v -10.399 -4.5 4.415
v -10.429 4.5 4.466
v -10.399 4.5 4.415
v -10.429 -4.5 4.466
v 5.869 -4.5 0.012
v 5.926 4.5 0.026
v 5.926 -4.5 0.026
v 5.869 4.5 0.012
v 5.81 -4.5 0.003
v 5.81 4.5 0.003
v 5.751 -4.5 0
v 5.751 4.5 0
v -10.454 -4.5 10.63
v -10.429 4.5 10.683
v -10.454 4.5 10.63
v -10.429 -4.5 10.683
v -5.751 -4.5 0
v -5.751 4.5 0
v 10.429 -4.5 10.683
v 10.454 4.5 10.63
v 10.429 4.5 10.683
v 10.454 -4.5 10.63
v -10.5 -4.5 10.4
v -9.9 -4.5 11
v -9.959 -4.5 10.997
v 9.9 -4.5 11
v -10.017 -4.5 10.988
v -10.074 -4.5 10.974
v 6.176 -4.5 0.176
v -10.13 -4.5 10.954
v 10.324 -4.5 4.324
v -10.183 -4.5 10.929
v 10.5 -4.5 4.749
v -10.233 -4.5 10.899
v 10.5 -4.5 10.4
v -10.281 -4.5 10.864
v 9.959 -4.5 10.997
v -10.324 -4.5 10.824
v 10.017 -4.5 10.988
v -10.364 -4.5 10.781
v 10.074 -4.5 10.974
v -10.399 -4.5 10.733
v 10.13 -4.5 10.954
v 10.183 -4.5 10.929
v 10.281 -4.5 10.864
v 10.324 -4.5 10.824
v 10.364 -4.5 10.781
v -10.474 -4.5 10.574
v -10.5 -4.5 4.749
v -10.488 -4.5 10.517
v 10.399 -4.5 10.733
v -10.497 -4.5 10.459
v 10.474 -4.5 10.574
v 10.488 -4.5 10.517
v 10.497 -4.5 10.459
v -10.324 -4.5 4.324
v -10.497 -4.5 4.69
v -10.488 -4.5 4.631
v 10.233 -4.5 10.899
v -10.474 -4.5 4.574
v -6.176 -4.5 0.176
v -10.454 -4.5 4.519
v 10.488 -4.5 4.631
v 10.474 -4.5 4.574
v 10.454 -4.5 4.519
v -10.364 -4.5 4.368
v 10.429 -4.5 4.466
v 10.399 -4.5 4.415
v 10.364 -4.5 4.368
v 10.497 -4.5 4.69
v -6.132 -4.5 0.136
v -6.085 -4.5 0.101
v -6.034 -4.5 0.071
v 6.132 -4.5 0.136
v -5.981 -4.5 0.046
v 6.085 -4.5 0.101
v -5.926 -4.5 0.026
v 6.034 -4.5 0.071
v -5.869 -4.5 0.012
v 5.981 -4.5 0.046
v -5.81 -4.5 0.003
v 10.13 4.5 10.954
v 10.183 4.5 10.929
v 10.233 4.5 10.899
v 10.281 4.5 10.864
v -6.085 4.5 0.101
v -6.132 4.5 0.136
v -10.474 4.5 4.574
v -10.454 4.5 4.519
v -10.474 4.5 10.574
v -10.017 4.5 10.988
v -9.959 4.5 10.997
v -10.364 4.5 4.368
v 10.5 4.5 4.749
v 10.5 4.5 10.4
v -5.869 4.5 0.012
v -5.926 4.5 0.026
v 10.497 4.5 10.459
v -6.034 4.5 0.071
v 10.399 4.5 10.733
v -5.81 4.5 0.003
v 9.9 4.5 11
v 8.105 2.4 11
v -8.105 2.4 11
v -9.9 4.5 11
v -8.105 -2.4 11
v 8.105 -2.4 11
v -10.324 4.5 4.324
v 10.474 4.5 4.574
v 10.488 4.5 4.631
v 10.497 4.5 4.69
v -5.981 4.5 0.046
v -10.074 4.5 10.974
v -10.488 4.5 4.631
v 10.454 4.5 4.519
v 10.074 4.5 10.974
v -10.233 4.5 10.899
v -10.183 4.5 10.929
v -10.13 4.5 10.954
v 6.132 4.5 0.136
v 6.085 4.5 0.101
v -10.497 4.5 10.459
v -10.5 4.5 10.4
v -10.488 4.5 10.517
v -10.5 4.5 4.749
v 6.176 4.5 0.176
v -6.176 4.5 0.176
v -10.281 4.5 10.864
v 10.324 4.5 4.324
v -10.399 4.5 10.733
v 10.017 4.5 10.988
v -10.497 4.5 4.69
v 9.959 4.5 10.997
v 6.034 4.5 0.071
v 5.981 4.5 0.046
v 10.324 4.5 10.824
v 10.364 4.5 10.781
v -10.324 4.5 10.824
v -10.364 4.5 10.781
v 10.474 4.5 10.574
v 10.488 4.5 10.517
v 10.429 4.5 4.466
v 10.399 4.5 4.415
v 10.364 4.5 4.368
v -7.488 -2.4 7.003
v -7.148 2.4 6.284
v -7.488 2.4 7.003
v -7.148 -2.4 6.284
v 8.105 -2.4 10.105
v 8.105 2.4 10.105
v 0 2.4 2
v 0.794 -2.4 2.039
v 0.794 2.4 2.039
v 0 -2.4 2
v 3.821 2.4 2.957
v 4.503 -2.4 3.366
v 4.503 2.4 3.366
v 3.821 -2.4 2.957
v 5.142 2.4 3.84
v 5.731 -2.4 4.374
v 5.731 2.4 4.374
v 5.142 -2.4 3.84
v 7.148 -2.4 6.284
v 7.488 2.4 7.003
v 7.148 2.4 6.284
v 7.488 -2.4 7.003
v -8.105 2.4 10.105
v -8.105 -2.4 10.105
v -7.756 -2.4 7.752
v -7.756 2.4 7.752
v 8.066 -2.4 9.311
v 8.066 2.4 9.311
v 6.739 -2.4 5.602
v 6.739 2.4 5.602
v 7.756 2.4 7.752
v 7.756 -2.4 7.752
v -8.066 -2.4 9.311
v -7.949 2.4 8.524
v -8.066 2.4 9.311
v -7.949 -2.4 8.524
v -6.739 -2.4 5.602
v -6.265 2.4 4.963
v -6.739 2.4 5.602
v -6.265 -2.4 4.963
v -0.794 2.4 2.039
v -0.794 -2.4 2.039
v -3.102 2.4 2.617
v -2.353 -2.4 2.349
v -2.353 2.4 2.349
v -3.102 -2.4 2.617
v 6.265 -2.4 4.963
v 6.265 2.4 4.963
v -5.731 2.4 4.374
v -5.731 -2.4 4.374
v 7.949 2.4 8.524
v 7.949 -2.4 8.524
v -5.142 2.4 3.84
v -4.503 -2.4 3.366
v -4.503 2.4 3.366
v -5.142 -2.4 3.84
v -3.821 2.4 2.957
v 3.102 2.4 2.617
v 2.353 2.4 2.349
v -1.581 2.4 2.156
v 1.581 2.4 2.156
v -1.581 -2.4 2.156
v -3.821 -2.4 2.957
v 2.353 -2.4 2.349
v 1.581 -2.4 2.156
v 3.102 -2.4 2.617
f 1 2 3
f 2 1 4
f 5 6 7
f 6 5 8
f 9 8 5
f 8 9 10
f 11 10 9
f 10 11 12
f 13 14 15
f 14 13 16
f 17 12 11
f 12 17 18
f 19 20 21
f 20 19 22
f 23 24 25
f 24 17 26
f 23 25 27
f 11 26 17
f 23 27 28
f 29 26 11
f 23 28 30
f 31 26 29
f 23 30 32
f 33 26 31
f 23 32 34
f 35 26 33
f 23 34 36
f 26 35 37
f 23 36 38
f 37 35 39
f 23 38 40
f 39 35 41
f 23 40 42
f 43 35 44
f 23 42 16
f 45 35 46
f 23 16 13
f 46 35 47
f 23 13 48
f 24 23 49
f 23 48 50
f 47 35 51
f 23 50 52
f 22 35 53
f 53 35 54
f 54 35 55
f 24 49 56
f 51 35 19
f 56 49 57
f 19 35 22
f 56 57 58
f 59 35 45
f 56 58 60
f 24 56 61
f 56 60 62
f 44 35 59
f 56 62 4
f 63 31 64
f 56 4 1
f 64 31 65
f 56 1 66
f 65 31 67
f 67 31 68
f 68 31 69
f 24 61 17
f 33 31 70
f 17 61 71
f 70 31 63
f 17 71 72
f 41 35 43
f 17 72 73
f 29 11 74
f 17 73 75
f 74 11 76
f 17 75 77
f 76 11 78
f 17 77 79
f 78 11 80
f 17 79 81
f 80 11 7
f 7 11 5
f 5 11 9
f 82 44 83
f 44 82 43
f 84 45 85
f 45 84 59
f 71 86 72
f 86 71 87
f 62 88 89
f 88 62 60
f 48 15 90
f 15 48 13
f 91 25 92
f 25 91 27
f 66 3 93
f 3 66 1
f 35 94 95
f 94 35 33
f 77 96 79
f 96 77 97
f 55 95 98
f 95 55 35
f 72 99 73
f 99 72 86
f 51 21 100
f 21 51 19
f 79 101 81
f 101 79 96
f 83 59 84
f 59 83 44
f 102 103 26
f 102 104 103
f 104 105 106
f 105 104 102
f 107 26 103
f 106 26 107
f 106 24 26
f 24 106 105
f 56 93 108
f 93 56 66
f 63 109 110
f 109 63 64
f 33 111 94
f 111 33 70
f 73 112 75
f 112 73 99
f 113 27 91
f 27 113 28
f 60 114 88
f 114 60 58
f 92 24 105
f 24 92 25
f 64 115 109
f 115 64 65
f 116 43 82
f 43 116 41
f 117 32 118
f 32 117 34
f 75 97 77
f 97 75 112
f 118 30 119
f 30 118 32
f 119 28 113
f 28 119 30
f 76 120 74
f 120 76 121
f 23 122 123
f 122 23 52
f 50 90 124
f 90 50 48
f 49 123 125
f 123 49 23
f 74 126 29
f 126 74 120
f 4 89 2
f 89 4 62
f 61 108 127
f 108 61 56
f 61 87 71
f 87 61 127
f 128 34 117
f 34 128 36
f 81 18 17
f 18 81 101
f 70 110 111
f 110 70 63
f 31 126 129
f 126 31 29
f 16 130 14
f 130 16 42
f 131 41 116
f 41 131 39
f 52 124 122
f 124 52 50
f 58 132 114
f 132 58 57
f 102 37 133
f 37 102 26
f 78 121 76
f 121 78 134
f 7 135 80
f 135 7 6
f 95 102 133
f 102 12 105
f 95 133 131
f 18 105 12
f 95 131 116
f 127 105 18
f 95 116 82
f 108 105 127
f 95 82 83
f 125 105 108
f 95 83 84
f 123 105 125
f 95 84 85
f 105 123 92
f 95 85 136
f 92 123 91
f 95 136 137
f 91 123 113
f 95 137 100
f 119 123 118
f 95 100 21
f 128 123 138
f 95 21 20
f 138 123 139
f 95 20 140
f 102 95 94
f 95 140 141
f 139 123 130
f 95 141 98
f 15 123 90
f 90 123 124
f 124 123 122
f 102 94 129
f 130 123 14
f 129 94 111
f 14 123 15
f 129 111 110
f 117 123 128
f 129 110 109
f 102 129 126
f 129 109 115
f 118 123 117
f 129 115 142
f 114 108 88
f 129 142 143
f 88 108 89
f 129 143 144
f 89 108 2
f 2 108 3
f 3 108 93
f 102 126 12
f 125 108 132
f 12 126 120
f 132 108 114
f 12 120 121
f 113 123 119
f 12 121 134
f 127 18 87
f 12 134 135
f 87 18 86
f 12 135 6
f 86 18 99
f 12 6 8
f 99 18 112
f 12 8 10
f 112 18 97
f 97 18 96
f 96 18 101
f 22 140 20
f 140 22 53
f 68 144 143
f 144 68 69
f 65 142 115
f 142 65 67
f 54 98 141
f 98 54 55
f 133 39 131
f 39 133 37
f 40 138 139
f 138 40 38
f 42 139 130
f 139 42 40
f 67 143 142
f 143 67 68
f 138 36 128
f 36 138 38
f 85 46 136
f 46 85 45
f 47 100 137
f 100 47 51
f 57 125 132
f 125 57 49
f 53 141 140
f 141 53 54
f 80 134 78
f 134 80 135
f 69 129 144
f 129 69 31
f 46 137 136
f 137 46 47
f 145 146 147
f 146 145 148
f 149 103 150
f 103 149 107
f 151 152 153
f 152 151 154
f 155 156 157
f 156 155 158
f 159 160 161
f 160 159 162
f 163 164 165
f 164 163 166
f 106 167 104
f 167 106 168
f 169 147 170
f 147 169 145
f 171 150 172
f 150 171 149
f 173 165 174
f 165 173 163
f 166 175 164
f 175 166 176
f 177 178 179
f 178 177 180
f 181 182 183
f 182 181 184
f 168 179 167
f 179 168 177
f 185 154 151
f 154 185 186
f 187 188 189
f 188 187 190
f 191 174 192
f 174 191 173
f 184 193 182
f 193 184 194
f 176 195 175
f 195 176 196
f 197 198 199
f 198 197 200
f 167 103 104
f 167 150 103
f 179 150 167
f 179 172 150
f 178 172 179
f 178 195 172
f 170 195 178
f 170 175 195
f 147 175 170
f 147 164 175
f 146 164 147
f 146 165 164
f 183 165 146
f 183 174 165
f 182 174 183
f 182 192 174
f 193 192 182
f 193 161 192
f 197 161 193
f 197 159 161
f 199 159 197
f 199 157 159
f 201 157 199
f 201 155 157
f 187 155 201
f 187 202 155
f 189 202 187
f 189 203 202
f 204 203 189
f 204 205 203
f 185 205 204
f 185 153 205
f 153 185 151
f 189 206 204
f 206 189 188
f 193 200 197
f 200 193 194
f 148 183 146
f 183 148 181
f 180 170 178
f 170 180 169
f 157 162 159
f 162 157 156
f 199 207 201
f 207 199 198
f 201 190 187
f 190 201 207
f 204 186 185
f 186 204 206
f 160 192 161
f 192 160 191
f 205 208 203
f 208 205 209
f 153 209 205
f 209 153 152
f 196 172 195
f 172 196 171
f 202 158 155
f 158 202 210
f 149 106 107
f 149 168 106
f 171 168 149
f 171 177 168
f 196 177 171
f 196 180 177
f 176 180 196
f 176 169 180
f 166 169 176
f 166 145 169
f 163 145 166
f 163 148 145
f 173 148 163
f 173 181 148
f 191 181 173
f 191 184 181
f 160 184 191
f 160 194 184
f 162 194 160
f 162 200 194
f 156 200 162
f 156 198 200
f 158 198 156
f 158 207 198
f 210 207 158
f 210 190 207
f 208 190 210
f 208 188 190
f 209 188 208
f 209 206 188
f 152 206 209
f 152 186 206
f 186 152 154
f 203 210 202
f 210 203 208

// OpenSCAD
// MicroHuli passive rocker shoe, dimensions in mm.
// Fits the original STL at 100% scale; fit and walking performance unverified.
// Print in TPU, or add thin rubber to a rigid printed shoe's sole.
// CLI examples: -D 'part="shoe"', 'part="set"', 'part="fit"', 'part="assembly"'.
part = "shoe";
clearance = 0.2;       // Total extra cavity width AND thickness, not per side.
leg_width = 16.01;
leg_thickness = 4.6;
shoe_length = 21;
shoe_width = 9;
shoe_height = 11;
sole_skin = 2;
flat_contact_length = 12;
edge_round = 0.6;
$fn = 64;

assert(clearance >= 0 && clearance <= 1);
assert(shoe_length > leg_width + clearance + 2);
assert(shoe_width > leg_thickness + clearance + 2);

// Profile coordinates are fore/aft X and height Z. The central flat lands on
// the print bed; 45-degree toe/heel bevels let the shoe rock during the stride.
module outer_profile() {
    end_rise = (shoe_length - flat_contact_length) / 2;
    offset(r = edge_round)
        offset(delta = -edge_round)
            polygon([
                [-shoe_length/2, shoe_height],
                [ shoe_length/2, shoe_height],
                [ shoe_length/2, end_rise],
                [ flat_contact_length/2, 0],
                [-flat_contact_length/2, 0],
                [-shoe_length/2, end_rise]
            ]);
}

module tip_socket_profile(fit) {
    r = (leg_width + fit)/2;
    union() {
        translate([0, sole_skin + r]) circle(r = r);
        translate([-r, sole_skin + r]) square([2*r, shoe_height + 20]);
    }
}

module shoe(fit = clearance) {
    difference() {
        rotate([90, 0, 0])
            linear_extrude(height = shoe_width, center = true) outer_profile();
        rotate([90, 0, 0])
            linear_extrude(height = leg_thickness + fit, center = true)
                tip_socket_profile(fit);
    }
}

module shoe_set() {
    for (x = [-13, 13], y = [-7, 7]) translate([x, y, 0]) shoe();
}

// Three disconnected, low-material sizing rings: left = 0.0 mm extra,
// middle = 0.2 mm, right = 0.4 mm. Slide over a leg tip before printing shoes.
module fit_gauges() {
    for (i = [0:2]) {
        fit = i * 0.2;
        translate([(i-1)*25, 0, 0])
            linear_extrude(height = 3)
                difference() {
                    offset(r = 1) offset(delta = -1)
                        square([shoe_length, shoe_width], center = true);
                    square([leg_width + fit, leg_thickness + fit], center = true);
                }
    }
}

module original_leg_for_preview() {
    // Reorient just the first leg from the provided print layout. This import
    // is for the assembly preview only and is not part of any shoe STL export.
    multmatrix([
        [1, 0, 0, -6.005],
        [0, 0, 1, -2.3],
        [0, 1, 0, 49 + sole_skin],
        [0, 0, 0, 1]
    ]) intersection() {
        import("../../stl_files/MicroHuli.stl");
        translate([-3, -50, -1]) cube([18, 47, 7]);
    }
}

if (part == "shoe") shoe();
else if (part == "set") shoe_set();
else if (part == "fit") fit_gauges();
else if (part == "assembly") {
    color([0.95, 0.71, 0.12]) original_leg_for_preview();
    color([0.08, 0.5, 0.8]) shoe();
}
else assert(false, "Unknown part selection");
